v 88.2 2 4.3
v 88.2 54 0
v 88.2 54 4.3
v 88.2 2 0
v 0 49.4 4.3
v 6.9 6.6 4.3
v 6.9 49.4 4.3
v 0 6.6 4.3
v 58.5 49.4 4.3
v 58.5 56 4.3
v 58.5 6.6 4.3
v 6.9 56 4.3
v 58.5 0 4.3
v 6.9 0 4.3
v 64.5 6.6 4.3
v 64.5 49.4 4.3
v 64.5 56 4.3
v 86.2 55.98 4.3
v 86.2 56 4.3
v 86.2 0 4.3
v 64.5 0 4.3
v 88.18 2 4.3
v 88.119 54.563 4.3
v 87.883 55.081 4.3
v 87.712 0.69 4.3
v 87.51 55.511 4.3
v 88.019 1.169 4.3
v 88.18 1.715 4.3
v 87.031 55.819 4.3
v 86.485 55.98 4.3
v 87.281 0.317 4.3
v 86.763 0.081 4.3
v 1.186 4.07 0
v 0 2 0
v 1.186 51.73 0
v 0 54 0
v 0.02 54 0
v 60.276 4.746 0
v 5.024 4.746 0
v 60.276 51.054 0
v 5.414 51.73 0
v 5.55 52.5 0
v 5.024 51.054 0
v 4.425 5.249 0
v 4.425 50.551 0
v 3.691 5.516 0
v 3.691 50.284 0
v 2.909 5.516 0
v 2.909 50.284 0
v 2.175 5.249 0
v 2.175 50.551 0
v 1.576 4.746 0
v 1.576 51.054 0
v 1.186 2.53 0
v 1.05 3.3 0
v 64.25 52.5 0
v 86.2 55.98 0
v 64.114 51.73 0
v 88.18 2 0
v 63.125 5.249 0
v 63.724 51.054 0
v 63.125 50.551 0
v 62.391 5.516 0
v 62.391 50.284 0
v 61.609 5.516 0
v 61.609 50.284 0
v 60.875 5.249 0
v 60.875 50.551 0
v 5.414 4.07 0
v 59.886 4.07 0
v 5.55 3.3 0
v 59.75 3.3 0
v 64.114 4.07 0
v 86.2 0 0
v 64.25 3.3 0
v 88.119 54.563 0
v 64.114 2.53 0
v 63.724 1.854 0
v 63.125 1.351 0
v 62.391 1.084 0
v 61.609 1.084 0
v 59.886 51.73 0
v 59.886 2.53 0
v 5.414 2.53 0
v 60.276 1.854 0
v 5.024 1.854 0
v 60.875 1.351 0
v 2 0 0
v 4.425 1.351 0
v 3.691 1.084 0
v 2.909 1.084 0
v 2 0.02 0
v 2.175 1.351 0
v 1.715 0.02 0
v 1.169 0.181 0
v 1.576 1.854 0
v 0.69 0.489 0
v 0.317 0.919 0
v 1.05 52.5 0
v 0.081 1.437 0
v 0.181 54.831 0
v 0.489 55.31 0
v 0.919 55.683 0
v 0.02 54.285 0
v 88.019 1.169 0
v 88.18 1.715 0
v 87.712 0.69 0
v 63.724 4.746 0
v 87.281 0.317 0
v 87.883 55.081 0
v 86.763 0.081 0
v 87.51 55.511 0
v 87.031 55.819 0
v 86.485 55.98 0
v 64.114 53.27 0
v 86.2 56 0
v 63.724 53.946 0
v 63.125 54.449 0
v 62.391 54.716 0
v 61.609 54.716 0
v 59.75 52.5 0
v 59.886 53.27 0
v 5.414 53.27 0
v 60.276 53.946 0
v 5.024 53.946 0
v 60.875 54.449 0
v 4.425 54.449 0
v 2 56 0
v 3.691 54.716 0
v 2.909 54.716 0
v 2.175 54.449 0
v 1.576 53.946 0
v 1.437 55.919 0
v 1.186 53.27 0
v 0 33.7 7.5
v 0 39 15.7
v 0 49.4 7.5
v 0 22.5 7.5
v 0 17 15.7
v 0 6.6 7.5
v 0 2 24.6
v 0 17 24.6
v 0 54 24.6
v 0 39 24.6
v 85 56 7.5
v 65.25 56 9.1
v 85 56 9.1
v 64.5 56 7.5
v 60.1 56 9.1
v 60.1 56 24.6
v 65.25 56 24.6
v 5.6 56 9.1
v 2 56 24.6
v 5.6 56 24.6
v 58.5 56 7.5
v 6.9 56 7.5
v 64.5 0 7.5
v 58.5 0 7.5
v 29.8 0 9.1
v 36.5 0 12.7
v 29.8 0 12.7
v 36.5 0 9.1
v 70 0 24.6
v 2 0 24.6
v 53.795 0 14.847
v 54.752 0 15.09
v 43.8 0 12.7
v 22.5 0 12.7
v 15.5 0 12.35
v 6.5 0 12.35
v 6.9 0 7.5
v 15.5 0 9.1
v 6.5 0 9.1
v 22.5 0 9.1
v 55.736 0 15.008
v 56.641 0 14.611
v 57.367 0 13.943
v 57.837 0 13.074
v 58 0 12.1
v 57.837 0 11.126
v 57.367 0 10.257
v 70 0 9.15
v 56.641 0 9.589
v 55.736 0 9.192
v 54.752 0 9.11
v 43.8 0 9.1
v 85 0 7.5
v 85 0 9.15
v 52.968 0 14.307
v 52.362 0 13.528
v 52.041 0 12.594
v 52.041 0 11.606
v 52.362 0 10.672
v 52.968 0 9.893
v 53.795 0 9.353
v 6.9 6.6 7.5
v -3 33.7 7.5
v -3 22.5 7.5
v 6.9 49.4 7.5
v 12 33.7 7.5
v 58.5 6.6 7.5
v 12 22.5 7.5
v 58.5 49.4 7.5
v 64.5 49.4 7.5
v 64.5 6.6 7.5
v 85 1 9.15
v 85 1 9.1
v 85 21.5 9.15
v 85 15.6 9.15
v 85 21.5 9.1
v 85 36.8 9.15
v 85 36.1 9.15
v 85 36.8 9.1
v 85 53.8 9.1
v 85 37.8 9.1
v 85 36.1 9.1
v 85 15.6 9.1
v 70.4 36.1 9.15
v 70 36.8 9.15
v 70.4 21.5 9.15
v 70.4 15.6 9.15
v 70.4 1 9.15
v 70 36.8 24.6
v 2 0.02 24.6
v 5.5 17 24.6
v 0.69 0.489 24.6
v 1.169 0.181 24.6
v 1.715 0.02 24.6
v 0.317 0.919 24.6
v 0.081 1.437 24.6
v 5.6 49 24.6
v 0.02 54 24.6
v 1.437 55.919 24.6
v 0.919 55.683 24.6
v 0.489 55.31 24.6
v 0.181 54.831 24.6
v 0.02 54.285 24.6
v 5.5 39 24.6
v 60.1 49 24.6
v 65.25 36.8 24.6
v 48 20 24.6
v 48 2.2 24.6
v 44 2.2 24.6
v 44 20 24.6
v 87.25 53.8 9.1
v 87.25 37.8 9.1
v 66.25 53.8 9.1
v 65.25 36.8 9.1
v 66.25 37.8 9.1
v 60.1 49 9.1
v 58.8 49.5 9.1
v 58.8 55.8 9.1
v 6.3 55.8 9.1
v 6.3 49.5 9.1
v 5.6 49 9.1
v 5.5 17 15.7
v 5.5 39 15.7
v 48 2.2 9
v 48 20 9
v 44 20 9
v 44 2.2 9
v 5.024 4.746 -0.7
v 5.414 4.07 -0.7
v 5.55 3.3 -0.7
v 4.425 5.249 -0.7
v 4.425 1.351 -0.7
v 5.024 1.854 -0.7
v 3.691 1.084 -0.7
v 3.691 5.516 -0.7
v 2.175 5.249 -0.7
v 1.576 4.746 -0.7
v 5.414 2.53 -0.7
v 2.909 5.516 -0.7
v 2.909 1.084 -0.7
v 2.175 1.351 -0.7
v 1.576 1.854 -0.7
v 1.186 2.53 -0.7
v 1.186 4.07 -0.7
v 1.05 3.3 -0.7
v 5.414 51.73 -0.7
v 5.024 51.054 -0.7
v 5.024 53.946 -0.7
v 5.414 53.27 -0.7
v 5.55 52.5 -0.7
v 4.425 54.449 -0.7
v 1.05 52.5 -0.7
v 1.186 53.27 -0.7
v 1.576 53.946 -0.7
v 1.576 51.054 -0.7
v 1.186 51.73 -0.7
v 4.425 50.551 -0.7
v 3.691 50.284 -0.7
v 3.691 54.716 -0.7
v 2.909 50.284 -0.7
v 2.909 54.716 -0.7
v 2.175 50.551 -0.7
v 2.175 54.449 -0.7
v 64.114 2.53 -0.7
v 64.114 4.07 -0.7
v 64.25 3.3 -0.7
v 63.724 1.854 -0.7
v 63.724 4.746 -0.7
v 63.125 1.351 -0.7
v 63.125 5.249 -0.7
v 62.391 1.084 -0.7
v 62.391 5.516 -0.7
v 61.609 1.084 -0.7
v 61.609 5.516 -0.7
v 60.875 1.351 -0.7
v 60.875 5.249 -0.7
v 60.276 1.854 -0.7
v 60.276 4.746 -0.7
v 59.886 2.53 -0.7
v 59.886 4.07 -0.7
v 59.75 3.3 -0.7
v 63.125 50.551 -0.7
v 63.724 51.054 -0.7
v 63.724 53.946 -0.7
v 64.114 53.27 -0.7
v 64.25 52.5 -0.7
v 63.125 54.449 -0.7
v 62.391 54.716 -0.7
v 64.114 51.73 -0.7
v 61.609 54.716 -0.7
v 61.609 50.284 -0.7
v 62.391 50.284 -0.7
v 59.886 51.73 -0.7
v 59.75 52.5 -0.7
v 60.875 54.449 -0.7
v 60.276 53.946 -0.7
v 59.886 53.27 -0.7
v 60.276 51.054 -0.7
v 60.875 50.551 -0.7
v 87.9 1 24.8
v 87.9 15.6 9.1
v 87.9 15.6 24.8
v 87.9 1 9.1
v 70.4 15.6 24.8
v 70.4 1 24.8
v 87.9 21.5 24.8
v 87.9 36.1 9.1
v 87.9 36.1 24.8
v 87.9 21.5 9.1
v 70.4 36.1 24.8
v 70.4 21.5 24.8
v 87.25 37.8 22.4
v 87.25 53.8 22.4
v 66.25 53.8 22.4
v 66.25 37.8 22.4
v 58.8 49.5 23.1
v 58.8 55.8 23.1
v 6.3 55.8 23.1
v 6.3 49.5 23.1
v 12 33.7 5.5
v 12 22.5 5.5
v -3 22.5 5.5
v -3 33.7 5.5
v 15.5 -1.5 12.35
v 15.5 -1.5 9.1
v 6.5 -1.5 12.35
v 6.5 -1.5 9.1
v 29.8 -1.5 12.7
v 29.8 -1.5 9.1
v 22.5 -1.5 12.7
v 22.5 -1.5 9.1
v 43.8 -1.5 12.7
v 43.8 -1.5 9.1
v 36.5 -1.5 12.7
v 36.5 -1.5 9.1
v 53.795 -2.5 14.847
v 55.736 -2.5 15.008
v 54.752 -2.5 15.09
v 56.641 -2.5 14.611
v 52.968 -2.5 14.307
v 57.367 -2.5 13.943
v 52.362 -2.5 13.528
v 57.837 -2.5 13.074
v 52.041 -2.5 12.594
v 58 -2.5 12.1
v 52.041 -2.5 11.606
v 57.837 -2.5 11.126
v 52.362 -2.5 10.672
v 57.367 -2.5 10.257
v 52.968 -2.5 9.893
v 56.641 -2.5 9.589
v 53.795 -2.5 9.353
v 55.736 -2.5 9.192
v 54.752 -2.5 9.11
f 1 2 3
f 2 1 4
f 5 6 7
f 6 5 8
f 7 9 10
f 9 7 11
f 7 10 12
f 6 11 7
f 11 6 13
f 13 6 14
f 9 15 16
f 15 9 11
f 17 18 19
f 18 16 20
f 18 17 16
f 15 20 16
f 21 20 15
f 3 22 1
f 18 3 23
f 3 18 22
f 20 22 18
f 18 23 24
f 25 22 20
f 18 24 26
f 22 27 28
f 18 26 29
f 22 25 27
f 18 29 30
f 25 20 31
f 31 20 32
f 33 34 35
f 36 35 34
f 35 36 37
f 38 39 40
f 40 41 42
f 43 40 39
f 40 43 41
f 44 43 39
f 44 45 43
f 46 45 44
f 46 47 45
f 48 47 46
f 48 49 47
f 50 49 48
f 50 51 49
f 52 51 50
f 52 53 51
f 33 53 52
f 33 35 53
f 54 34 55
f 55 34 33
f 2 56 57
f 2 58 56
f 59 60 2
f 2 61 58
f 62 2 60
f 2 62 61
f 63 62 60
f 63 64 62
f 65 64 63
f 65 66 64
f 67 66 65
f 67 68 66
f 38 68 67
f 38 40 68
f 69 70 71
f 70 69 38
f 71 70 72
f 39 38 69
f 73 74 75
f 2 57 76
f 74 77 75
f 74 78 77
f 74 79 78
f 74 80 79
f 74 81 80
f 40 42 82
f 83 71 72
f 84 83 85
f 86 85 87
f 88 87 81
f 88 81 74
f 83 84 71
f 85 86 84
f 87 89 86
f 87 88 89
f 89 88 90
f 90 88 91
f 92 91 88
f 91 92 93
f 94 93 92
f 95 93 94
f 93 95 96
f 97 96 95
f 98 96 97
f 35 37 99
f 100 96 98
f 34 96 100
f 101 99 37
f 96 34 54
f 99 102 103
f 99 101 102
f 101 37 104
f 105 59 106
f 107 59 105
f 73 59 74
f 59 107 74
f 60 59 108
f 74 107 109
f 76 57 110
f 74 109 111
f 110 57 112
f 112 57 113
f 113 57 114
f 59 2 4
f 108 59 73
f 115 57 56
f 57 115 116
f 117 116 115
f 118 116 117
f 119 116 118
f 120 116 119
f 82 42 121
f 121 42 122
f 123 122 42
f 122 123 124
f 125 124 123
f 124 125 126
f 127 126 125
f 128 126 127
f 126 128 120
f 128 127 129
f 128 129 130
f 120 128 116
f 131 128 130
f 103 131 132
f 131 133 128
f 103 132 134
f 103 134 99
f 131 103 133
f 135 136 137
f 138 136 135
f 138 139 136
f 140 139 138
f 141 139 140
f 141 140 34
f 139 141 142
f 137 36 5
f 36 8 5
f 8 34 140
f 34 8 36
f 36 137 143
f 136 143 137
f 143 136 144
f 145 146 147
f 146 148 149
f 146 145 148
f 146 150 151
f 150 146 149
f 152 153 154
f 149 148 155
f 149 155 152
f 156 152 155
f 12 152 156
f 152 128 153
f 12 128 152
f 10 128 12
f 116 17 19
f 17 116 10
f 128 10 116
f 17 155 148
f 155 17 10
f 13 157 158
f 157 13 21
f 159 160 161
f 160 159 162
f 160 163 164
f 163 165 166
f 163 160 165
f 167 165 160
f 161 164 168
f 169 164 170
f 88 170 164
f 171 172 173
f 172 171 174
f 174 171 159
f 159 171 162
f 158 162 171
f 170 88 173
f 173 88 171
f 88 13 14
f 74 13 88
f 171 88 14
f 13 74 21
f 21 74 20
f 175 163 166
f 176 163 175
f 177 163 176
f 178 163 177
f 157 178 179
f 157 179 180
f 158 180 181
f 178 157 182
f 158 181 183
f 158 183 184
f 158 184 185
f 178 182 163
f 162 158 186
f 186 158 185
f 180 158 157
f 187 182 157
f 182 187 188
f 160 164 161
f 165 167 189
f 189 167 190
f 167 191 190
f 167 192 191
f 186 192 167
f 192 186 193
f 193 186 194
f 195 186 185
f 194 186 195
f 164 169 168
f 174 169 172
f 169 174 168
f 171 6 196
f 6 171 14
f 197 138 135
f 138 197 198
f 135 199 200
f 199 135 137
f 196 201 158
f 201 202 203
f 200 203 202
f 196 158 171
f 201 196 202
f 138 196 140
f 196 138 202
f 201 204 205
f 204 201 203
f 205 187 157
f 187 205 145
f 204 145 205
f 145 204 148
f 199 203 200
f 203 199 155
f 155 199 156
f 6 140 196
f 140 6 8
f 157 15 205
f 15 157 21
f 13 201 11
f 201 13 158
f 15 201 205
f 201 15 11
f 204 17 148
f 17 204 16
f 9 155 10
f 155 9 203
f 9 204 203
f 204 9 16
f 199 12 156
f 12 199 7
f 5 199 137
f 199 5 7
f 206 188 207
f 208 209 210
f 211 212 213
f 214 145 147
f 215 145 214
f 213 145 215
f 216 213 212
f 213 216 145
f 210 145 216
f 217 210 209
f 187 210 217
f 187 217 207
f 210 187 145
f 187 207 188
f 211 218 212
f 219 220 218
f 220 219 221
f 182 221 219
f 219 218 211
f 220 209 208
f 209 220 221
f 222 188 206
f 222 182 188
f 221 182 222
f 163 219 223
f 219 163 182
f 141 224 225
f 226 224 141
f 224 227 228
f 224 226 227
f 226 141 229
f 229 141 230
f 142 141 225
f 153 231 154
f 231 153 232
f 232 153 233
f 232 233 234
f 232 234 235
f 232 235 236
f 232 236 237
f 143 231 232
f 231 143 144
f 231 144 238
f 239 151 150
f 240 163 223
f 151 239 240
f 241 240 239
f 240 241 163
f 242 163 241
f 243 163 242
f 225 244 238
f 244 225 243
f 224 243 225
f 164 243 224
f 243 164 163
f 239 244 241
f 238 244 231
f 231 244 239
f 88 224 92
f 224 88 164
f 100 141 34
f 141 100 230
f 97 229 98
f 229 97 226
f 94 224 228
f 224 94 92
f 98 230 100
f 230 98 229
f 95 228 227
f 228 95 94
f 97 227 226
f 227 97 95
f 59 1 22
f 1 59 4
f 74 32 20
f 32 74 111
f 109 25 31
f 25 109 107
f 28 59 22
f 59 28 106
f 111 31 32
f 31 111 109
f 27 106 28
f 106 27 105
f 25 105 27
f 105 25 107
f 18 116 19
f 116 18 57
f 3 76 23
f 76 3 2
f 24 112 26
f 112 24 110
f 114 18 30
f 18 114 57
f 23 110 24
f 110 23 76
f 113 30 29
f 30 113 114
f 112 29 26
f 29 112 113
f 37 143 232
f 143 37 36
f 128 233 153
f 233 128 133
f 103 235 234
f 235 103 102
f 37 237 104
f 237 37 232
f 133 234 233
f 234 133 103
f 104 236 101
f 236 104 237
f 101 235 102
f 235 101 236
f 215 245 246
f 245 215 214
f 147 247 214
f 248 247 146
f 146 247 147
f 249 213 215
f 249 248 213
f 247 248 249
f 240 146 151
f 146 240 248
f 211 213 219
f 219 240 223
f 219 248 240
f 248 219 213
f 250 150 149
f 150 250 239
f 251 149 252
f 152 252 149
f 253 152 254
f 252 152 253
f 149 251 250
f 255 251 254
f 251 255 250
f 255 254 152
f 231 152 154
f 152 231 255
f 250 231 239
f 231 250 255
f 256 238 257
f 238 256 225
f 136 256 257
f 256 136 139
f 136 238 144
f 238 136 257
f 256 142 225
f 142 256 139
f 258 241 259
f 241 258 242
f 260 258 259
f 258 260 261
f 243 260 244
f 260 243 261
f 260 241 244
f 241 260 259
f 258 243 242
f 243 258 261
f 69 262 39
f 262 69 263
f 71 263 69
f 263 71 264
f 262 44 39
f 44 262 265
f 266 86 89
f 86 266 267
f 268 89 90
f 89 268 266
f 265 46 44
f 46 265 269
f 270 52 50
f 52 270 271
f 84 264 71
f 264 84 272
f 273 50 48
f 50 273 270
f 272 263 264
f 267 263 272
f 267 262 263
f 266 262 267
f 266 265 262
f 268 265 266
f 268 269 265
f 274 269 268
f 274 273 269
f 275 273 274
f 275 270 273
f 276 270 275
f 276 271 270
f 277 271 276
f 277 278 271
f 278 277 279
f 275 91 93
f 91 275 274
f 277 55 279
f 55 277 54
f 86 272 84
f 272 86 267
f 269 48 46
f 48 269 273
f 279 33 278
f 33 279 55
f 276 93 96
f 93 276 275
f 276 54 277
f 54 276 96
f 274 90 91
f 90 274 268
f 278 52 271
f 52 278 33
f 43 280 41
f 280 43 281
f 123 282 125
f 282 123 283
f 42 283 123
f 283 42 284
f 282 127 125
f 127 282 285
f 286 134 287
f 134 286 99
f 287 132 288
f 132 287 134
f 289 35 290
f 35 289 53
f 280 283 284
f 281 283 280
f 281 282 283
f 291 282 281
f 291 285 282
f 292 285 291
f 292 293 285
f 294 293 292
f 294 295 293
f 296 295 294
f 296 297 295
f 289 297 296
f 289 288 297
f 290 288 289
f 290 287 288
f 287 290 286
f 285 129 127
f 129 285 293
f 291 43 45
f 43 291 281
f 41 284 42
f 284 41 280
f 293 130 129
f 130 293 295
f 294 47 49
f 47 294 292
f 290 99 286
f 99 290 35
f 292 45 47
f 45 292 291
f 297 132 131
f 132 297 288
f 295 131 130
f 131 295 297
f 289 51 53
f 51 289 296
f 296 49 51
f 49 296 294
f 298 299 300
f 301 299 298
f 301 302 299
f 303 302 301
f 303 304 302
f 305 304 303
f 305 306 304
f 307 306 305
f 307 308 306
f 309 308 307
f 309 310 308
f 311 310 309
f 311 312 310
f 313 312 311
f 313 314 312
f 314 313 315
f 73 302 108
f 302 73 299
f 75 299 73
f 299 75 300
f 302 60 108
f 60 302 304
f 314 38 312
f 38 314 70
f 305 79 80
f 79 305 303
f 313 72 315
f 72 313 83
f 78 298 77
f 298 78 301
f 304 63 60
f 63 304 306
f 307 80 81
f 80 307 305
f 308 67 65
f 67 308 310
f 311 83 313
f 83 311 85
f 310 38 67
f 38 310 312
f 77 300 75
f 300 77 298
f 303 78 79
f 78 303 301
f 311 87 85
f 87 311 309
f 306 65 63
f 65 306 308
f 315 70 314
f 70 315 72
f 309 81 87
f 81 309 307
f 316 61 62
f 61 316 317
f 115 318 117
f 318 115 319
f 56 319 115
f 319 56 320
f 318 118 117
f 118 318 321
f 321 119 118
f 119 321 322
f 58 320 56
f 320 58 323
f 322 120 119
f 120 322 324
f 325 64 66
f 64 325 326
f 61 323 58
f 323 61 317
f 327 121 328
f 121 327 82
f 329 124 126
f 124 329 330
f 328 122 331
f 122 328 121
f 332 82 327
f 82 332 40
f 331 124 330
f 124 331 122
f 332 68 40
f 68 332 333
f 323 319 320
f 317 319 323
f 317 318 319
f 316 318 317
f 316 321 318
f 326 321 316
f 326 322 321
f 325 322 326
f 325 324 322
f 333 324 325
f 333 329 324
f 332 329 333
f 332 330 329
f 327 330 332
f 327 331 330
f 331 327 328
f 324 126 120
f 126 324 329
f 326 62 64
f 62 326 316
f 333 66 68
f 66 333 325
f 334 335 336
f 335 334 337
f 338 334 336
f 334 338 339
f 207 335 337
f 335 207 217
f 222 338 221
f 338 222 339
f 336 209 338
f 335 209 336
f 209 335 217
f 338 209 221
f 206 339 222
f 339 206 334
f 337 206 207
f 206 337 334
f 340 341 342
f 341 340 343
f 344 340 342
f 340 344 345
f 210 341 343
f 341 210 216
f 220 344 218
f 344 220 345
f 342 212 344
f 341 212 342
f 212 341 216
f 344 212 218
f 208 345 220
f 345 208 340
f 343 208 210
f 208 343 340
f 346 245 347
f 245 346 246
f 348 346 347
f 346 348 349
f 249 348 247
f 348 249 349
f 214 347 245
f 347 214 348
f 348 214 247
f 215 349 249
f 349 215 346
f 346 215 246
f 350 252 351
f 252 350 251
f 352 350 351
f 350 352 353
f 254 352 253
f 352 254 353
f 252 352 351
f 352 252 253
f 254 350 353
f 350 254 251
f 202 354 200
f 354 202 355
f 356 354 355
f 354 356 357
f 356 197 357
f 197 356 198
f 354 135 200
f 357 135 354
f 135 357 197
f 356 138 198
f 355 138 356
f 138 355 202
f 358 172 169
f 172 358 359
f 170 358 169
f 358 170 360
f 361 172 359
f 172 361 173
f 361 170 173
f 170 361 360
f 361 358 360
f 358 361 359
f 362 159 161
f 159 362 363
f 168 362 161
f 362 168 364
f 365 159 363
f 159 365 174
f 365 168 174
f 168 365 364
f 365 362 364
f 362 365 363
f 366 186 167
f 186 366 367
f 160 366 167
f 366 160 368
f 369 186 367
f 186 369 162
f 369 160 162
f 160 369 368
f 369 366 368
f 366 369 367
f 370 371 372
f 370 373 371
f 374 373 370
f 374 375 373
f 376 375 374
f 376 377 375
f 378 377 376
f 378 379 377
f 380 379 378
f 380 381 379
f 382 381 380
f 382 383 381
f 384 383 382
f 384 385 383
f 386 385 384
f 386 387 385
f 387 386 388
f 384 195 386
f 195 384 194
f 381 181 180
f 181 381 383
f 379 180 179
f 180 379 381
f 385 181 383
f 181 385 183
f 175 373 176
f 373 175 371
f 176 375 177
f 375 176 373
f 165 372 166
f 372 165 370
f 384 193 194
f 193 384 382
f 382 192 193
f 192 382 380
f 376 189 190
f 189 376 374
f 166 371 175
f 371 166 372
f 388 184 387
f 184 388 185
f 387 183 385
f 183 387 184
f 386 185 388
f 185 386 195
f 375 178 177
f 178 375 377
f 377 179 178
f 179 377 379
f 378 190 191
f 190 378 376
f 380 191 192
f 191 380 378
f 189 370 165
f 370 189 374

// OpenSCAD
// file: rounder.scad
// rounder.scad
// cutting tool for rounding off corners with a cylinder

//---------------------
module rounder(
r=10,   // radius
h=10,   // height
f=22,    // $fn
extra=0.01  // extra size for the cube
){

difference(){
  translate([-extra,-extra,-extra])
  cube([r+extra,r+extra,h+2*extra]);
  translate([r,r,-1])
  cylinder(r=r,h=h+2,$fn=f);
}

}

//========================

rounder();

//========================
// main file
// pi4.scad
// 

use <../Parts/rounder.scad>

//---------------------
module pi4case(tol=0){

difference(){
  union(){
    // base block
    color("gray"){
      cube([88.2,56,4.3]);

      // feet on base block
      cube([6.9,6.6,7.5]);
      translate([58.5,0,0])
      cube([6.0,6.6,7.5]);
      translate([58.5,56-6.6,0])
      cube([6.0,6.6,7.5]);
      translate([0,56-6.6,0])
      cube([6.9,6.6,7.5]);
    }
    
    // pcb
    color("green")
    translate([0,0,7.5])
    cube([85,56,1.65]);

    // top block
    color("gray")
    translate([0,0,9.1])
    cube([70,56,15.5]);
  }

  // round the 4 corners
  rounder(r=2,h=25);
  translate([88.2,0,0])
  rotate([0,0,90])
  rounder(r=2,h=25);
  translate([88.2,56,0])
  rotate([0,0,180])
  rounder(r=2,h=25);
  translate([0,56,0])
  rotate([0,0,270])
  rounder(r=2,h=25);

  // cut for ethernet
  translate([65.25,36.8,9.1])
  cube([22,20,24]);

  // cut for ribbon cable
  translate([5.6,49,9.1])
  cube([54.5,8,24]);

  // cut for display cable
  translate([-0.1,17,15.7])
  cube([5.6,22,15]);

  // cut for camera cable
  translate([44,2.2,9.0])
  cube([4,17.8,20]);

}

// screw heads on bottom side stick out a bit
translate([3.3,3.3,-0.7])
cylinder(r=4.5/2,h=1,$fn=18);
translate([3.3,52.5,-0.7])
cylinder(r=4.5/2,h=1,$fn=18);
translate([62,3.3,-0.7])
cylinder(r=4.5/2,h=1,$fn=18);
translate([62,52.5,-0.7])
cylinder(r=4.5/2,h=1,$fn=18);

// usb host
translate([70.4,1.0,9.1])
cube([17.5,14.6,15.7]);
translate([70.4,21.5,9.1])
cube([17.5,14.6,15.7]);

// ethernet
translate([66.25,37.8,9.1])
cube([21,16,13.3]);

// ribbon cable
translate([6.3,49.5,9.1])
cube([52.5,6.3,14]);

// SD card, oversize so we get a single solid
color("red")
translate([-3,22.5,5.5])
cube([15,11.2,2]);

// USB power jack
translate([6.5,-1.5,9.1])
cube([9,5,3.25]);

// micro HDMI 0
translate([22.5,-1.5,9.1])
cube([7.3,5,3.6]);

// micro HDMI 1
translate([36.5,-1.5,9.1])
cube([7.3,5,3.6]);

// stereo out jack
translate([55,-2.5,9.1+3])
rotate([-90,0,0])
cylinder(r=3,h=5,$fn=19);

}

//==========================

pi4case();


//==========================
